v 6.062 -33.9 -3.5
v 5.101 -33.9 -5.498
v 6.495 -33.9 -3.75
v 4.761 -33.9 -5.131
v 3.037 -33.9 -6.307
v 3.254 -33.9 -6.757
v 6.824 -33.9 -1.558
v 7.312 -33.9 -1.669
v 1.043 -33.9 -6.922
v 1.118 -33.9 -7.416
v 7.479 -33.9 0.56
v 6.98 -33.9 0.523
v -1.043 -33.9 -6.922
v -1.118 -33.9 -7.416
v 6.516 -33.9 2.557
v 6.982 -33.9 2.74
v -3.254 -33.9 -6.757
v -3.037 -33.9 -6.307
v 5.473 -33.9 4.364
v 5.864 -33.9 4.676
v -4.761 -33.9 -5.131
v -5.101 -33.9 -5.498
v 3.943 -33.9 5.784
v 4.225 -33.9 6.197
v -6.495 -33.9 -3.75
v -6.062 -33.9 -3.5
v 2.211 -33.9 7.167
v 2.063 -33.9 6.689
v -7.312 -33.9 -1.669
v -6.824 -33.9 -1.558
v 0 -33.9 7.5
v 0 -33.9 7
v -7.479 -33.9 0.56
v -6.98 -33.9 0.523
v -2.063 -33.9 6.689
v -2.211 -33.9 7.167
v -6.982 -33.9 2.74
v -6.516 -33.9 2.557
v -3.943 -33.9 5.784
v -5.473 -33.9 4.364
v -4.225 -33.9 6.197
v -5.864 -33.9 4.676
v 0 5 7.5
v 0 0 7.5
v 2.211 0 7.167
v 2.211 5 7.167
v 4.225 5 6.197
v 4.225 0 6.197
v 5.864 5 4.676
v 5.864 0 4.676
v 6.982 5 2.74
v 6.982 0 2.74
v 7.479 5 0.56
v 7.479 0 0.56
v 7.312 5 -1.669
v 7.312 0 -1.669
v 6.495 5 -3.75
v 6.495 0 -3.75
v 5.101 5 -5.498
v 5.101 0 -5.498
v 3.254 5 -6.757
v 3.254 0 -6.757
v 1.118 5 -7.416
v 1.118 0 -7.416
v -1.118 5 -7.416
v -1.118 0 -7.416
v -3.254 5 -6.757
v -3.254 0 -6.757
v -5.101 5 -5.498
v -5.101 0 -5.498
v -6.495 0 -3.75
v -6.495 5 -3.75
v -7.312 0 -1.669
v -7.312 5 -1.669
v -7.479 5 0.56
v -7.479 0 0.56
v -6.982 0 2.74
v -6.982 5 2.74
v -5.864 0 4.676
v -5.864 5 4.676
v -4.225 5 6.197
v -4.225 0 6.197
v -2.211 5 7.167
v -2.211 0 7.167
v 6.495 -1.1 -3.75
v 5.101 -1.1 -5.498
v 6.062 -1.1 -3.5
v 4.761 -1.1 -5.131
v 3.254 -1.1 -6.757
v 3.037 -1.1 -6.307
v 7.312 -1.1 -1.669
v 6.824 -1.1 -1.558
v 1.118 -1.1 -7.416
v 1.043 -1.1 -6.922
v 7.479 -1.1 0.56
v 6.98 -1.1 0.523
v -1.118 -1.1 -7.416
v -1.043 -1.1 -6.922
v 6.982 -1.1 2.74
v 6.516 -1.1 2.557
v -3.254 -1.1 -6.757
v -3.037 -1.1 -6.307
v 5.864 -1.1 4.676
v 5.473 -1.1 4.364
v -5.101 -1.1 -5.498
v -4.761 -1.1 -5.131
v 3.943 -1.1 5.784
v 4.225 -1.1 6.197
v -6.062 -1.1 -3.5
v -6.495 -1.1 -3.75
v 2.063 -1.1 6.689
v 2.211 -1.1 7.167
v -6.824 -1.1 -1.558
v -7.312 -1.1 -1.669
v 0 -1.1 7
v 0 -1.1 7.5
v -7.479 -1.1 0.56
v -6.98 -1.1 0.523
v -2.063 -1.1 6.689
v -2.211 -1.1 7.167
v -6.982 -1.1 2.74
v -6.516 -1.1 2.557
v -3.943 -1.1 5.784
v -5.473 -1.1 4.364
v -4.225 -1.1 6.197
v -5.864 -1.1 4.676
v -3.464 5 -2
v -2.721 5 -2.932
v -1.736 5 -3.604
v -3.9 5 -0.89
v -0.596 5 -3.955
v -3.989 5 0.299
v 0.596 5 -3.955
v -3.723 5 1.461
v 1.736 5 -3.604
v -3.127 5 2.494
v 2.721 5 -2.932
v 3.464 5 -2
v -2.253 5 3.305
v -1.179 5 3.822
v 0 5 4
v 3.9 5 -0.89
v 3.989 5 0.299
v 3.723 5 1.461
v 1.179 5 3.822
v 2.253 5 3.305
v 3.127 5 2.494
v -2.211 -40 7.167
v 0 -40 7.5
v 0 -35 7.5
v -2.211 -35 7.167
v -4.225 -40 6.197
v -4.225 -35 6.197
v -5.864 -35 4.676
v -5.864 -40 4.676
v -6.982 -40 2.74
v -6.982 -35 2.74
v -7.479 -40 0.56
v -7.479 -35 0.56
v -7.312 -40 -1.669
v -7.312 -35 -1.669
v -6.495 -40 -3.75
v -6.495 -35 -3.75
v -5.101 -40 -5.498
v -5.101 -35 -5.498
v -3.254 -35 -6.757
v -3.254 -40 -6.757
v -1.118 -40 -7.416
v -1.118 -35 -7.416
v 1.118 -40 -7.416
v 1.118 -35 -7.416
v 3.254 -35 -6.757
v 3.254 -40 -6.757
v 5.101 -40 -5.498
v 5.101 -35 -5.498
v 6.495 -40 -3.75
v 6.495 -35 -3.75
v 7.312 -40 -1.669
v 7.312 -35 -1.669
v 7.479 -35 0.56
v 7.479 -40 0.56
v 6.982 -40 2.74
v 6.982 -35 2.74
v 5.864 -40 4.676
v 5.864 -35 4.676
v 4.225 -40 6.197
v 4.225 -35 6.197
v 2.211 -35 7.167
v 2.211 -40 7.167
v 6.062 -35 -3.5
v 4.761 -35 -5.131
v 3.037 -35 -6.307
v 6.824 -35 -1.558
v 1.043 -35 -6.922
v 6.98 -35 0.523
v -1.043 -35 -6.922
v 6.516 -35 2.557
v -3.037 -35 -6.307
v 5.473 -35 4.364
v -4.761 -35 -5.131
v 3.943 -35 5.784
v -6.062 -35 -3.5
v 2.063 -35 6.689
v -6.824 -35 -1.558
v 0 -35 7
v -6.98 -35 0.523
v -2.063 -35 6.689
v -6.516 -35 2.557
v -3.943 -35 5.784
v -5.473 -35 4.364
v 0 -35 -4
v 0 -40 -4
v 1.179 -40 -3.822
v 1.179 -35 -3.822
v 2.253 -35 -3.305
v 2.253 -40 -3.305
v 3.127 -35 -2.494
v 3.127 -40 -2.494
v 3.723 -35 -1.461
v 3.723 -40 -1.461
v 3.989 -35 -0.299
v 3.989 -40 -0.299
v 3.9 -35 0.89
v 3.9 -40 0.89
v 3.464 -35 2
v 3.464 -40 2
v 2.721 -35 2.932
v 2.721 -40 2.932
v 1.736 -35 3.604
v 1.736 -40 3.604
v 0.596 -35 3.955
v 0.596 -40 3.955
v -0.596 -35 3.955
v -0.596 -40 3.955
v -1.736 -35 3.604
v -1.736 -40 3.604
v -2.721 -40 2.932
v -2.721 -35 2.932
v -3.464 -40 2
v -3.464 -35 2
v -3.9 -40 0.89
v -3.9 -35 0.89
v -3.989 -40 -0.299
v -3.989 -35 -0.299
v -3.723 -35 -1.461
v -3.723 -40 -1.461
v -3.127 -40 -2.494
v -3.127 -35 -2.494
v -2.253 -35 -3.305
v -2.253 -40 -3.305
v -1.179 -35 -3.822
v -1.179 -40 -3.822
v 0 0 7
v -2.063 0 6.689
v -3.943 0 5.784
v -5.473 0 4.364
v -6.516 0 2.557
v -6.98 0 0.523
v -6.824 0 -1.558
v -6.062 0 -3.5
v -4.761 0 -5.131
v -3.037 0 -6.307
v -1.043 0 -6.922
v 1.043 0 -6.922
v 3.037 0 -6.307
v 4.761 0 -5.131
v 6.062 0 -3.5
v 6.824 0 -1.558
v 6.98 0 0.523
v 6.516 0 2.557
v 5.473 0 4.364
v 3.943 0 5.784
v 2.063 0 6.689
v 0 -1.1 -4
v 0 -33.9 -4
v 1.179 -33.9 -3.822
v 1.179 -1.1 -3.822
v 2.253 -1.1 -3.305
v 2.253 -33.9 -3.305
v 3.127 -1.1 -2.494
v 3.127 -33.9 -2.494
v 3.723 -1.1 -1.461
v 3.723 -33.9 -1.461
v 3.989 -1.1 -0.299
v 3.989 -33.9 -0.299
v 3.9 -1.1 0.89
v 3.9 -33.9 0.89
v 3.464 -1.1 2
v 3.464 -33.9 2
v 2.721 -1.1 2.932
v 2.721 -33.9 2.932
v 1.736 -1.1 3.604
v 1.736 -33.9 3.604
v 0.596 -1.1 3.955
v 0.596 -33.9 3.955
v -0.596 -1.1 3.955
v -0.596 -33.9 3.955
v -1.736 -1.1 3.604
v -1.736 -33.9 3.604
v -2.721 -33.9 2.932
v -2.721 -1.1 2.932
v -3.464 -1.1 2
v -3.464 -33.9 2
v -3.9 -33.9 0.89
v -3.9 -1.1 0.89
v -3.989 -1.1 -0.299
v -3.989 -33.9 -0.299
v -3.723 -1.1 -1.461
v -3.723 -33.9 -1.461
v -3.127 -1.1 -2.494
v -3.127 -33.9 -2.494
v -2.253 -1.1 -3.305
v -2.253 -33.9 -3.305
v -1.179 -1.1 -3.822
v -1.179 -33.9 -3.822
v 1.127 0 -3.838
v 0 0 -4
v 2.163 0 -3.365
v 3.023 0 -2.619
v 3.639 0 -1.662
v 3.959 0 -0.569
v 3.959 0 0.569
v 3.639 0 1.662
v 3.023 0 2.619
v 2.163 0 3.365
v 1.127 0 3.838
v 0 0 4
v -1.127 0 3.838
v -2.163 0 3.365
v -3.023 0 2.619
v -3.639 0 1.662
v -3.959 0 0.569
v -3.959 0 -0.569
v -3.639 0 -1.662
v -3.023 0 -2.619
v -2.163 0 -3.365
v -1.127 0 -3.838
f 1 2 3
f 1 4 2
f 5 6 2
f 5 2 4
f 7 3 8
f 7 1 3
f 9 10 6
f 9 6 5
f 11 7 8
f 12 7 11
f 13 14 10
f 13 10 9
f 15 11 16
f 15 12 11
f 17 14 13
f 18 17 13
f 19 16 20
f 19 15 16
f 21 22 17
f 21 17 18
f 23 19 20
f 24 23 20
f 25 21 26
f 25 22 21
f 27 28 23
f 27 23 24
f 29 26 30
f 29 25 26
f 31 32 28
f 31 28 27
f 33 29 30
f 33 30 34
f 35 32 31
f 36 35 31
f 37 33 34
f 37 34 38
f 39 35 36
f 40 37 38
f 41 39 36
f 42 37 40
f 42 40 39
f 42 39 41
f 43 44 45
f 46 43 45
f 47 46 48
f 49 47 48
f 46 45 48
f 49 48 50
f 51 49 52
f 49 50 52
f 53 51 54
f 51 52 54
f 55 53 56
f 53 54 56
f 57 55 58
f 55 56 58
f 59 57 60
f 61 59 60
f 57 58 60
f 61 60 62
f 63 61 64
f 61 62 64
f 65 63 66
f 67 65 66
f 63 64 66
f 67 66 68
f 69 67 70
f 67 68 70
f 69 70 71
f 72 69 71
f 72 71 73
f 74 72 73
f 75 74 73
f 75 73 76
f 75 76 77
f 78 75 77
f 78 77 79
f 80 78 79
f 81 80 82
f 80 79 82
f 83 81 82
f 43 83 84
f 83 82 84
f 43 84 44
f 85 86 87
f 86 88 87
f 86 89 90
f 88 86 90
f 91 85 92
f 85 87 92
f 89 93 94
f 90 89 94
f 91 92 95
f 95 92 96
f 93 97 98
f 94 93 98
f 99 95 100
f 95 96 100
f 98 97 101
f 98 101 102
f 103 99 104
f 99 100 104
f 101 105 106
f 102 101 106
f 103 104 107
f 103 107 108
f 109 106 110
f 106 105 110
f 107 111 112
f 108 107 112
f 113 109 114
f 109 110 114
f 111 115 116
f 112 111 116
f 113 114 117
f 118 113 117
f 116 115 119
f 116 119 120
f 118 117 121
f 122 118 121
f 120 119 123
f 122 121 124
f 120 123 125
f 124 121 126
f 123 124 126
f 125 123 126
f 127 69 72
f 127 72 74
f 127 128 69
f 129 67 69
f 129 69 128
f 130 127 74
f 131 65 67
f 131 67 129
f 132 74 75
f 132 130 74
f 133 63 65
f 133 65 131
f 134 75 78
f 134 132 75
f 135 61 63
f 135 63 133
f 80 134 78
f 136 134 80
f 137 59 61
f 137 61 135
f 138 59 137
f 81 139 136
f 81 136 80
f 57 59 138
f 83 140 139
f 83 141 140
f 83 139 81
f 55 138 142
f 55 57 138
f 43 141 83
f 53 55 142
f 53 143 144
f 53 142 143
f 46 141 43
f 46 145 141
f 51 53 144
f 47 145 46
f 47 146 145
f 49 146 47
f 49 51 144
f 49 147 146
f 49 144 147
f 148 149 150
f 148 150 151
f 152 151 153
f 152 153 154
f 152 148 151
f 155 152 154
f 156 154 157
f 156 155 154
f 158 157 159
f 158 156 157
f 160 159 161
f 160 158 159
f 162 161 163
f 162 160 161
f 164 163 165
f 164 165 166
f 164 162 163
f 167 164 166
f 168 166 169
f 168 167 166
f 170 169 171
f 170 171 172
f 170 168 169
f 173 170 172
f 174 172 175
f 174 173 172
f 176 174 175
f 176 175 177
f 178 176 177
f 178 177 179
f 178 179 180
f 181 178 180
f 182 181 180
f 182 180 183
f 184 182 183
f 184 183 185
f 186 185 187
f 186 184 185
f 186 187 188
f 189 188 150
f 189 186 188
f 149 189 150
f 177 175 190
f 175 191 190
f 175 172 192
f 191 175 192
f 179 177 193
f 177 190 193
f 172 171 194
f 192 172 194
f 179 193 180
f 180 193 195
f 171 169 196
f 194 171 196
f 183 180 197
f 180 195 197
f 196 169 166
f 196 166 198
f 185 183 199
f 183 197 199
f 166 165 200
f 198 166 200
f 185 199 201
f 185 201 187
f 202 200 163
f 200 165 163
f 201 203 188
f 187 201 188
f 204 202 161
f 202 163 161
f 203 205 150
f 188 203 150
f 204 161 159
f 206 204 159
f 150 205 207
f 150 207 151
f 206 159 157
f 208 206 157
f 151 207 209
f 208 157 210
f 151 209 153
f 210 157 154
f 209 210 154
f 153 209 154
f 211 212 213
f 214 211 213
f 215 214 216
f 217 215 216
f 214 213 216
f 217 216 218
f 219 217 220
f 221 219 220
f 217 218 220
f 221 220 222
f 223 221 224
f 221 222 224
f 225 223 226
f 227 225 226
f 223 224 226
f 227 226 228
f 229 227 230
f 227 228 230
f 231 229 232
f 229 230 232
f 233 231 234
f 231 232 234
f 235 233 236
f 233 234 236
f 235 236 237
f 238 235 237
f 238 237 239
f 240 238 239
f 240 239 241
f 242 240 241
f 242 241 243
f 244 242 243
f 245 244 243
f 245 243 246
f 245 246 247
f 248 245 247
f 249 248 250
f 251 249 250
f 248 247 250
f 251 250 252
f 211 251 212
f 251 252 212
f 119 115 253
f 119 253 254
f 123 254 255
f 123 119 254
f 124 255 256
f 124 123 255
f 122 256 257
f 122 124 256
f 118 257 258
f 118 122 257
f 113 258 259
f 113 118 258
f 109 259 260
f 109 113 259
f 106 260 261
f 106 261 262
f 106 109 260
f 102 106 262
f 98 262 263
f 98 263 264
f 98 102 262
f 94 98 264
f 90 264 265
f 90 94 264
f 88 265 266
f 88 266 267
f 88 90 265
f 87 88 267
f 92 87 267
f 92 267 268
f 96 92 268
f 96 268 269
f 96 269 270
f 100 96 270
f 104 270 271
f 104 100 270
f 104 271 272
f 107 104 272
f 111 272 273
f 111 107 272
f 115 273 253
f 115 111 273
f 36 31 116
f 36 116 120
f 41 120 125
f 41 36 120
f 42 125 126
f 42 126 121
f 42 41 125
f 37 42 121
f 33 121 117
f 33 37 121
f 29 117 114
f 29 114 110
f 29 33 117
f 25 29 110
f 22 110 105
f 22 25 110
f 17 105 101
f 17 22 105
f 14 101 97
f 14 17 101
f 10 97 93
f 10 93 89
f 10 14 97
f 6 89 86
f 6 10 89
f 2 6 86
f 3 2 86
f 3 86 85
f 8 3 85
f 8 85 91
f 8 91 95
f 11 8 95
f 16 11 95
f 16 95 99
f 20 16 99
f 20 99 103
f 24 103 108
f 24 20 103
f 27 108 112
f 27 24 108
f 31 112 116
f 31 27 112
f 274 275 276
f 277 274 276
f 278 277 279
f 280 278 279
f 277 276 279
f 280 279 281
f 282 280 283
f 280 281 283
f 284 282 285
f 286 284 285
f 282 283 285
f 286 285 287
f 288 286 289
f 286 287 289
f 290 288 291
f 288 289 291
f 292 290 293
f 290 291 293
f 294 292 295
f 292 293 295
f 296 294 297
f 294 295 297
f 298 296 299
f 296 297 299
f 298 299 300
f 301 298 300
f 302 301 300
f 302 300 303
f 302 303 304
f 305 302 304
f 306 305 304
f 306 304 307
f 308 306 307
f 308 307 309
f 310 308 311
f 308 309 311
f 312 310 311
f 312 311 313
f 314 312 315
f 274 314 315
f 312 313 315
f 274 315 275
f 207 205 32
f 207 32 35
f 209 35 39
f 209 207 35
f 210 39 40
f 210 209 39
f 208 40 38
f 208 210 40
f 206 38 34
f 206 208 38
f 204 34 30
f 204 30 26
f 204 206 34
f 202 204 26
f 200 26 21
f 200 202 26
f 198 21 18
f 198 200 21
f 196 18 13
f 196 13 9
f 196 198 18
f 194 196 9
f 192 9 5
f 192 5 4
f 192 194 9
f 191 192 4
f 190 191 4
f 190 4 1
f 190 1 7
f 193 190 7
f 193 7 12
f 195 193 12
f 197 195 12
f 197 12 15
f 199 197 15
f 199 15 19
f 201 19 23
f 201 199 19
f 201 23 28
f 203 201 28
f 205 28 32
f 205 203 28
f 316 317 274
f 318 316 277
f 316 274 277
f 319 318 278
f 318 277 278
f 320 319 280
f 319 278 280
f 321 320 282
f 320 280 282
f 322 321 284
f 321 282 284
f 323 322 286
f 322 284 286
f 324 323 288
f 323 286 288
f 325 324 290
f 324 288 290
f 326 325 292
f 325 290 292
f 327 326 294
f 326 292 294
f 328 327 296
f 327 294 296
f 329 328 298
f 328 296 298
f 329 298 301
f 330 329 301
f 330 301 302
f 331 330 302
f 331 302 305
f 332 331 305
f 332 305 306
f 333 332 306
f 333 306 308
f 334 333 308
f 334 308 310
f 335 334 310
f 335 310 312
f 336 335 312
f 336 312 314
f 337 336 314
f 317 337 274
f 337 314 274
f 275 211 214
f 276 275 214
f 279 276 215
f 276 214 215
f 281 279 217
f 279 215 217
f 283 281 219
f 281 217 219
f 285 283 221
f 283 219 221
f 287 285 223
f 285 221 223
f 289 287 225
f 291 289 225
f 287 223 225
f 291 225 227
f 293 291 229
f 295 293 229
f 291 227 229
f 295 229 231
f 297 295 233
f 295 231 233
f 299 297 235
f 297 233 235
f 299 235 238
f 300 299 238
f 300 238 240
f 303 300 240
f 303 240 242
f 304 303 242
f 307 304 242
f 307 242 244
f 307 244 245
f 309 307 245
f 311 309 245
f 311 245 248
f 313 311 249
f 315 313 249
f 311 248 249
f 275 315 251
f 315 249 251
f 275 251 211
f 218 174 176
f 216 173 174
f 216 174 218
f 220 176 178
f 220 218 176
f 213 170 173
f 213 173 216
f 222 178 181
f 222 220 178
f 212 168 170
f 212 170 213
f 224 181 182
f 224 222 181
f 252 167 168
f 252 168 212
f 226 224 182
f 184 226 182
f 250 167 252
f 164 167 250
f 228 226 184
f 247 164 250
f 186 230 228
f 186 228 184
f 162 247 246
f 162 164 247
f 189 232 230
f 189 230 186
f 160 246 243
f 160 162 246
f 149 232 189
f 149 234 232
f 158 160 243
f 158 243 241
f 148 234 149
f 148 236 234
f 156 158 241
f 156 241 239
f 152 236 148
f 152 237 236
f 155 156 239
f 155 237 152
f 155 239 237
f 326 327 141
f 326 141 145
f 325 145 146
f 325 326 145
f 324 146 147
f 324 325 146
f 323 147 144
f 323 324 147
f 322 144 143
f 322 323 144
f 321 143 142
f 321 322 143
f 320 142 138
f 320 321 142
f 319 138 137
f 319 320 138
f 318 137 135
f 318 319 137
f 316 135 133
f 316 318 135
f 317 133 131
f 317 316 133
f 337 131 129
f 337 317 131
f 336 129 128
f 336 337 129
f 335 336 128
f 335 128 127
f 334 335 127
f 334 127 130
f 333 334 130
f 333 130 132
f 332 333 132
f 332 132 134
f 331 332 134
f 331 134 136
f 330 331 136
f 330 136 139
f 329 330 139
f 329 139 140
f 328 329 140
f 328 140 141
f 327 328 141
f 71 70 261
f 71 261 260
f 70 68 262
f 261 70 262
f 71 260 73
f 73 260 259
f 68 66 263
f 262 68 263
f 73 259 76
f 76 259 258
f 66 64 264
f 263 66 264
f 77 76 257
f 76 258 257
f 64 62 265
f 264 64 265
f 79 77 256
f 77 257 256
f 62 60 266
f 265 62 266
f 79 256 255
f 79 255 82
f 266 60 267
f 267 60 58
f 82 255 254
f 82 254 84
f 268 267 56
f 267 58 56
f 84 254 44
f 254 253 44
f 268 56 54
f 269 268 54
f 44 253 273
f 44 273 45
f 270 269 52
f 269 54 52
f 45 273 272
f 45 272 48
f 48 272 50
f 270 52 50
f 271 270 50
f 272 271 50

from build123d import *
from build123d.topology import SkipClean

# Parameters (mm, degrees)
SKETCH1_R           = 7.5
SKETCH1_R_2         = 4
BOSS_EXTRUDE1_DEPTH = 5
BOSS_EXTRUDE2_START = 1.1
SKETCH2_R           = 7
SKETCH2_R_2         = 4
BOSS_EXTRUDE2_DEPTH = 1.1
BOSS_EXTRUDE3_START = 32.8
SKETCH3_R           = 7.5
SKETCH3_R_2         = 4
BOSS_EXTRUDE3_DEPTH = 32.8
BOSS_EXTRUDE5_START = 1.1
SKETCH5_R           = 7
SKETCH5_R_2         = 4
BOSS_EXTRUDE5_DEPTH = 1.1
BOSS_EXTRUDE6_START = 5
SKETCH6_R           = 7.5
SKETCH6_R_2         = 4
BOSS_EXTRUDE6_DEPTH = 5


with BuildPart() as part:
    # Sketch1 → Boss-Extrude1 (new body)
    with BuildSketch(Plane(origin=(0, 0, 0), x_dir=(1, 0, 0), z_dir=(0, 1, 0))):
        with Locations(Location((0, 0, 0), (0, 0, 270))):
            Circle(SKETCH1_R)
        with Locations(Location((0, 0, 0), (0, 0, 270))):
            Circle(SKETCH1_R_2, mode=Mode.SUBTRACT)
    extrude(amount=BOSS_EXTRUDE1_DEPTH)

    # Sketch2 → Boss-Extrude2 (add)
    with SkipClean():  # the faces are left unmerged after this step: merging them gives an invalid solid
        with BuildSketch(Plane.XZ.offset(BOSS_EXTRUDE2_START)):
            with Locations(Location((0, 0, 0), (0, 0, 90))):
                Circle(SKETCH2_R)
            with Locations(Location((0, 0, 0), (0, 0, 270))):
                Circle(SKETCH2_R_2, mode=Mode.SUBTRACT)
        extrude(amount=-BOSS_EXTRUDE2_DEPTH)

    # Sketch3 → Boss-Extrude3 (add)
    with SkipClean():  # the faces are left unmerged after this step: merging them gives an invalid solid
        with BuildSketch(Plane.XZ.offset(1.1).offset(BOSS_EXTRUDE3_START)):
            with Locations(Location((0, 0, 0), (0, 0, 90))):
                Circle(SKETCH3_R)
            with Locations(Location((0, 0, 0), (0, 0, 270))):
                Circle(SKETCH3_R_2, mode=Mode.SUBTRACT)
        extrude(amount=-BOSS_EXTRUDE3_DEPTH)

    # Sketch5 → Boss-Extrude5 (add)
    with SkipClean():  # the faces are left unmerged after this step: merging them gives an invalid solid
        with BuildSketch(Plane.XZ.offset(33.9).offset(BOSS_EXTRUDE5_START)):
            with Locations(Location((0, 0, 0), (0, 0, 90))):
                Circle(SKETCH5_R)
            with Locations(Location((0, 0, 0), (0, 0, 270))):
                Circle(SKETCH5_R_2, mode=Mode.SUBTRACT)
        extrude(amount=-BOSS_EXTRUDE5_DEPTH)

    # Sketch6 → Boss-Extrude6 (add)
    with SkipClean():  # the faces are left unmerged after this step: merging them gives an invalid solid
        with BuildSketch(Plane.XZ.offset(35).offset(BOSS_EXTRUDE6_START)):
            with Locations(Location((0, 0, 0), (0, 0, 90))):
                Circle(SKETCH6_R)
            with Locations(Location((0, 0, 0), (0, 0, 270))):
                Circle(SKETCH6_R_2, mode=Mode.SUBTRACT)
        extrude(amount=-BOSS_EXTRUDE6_DEPTH)


solid = part.part
